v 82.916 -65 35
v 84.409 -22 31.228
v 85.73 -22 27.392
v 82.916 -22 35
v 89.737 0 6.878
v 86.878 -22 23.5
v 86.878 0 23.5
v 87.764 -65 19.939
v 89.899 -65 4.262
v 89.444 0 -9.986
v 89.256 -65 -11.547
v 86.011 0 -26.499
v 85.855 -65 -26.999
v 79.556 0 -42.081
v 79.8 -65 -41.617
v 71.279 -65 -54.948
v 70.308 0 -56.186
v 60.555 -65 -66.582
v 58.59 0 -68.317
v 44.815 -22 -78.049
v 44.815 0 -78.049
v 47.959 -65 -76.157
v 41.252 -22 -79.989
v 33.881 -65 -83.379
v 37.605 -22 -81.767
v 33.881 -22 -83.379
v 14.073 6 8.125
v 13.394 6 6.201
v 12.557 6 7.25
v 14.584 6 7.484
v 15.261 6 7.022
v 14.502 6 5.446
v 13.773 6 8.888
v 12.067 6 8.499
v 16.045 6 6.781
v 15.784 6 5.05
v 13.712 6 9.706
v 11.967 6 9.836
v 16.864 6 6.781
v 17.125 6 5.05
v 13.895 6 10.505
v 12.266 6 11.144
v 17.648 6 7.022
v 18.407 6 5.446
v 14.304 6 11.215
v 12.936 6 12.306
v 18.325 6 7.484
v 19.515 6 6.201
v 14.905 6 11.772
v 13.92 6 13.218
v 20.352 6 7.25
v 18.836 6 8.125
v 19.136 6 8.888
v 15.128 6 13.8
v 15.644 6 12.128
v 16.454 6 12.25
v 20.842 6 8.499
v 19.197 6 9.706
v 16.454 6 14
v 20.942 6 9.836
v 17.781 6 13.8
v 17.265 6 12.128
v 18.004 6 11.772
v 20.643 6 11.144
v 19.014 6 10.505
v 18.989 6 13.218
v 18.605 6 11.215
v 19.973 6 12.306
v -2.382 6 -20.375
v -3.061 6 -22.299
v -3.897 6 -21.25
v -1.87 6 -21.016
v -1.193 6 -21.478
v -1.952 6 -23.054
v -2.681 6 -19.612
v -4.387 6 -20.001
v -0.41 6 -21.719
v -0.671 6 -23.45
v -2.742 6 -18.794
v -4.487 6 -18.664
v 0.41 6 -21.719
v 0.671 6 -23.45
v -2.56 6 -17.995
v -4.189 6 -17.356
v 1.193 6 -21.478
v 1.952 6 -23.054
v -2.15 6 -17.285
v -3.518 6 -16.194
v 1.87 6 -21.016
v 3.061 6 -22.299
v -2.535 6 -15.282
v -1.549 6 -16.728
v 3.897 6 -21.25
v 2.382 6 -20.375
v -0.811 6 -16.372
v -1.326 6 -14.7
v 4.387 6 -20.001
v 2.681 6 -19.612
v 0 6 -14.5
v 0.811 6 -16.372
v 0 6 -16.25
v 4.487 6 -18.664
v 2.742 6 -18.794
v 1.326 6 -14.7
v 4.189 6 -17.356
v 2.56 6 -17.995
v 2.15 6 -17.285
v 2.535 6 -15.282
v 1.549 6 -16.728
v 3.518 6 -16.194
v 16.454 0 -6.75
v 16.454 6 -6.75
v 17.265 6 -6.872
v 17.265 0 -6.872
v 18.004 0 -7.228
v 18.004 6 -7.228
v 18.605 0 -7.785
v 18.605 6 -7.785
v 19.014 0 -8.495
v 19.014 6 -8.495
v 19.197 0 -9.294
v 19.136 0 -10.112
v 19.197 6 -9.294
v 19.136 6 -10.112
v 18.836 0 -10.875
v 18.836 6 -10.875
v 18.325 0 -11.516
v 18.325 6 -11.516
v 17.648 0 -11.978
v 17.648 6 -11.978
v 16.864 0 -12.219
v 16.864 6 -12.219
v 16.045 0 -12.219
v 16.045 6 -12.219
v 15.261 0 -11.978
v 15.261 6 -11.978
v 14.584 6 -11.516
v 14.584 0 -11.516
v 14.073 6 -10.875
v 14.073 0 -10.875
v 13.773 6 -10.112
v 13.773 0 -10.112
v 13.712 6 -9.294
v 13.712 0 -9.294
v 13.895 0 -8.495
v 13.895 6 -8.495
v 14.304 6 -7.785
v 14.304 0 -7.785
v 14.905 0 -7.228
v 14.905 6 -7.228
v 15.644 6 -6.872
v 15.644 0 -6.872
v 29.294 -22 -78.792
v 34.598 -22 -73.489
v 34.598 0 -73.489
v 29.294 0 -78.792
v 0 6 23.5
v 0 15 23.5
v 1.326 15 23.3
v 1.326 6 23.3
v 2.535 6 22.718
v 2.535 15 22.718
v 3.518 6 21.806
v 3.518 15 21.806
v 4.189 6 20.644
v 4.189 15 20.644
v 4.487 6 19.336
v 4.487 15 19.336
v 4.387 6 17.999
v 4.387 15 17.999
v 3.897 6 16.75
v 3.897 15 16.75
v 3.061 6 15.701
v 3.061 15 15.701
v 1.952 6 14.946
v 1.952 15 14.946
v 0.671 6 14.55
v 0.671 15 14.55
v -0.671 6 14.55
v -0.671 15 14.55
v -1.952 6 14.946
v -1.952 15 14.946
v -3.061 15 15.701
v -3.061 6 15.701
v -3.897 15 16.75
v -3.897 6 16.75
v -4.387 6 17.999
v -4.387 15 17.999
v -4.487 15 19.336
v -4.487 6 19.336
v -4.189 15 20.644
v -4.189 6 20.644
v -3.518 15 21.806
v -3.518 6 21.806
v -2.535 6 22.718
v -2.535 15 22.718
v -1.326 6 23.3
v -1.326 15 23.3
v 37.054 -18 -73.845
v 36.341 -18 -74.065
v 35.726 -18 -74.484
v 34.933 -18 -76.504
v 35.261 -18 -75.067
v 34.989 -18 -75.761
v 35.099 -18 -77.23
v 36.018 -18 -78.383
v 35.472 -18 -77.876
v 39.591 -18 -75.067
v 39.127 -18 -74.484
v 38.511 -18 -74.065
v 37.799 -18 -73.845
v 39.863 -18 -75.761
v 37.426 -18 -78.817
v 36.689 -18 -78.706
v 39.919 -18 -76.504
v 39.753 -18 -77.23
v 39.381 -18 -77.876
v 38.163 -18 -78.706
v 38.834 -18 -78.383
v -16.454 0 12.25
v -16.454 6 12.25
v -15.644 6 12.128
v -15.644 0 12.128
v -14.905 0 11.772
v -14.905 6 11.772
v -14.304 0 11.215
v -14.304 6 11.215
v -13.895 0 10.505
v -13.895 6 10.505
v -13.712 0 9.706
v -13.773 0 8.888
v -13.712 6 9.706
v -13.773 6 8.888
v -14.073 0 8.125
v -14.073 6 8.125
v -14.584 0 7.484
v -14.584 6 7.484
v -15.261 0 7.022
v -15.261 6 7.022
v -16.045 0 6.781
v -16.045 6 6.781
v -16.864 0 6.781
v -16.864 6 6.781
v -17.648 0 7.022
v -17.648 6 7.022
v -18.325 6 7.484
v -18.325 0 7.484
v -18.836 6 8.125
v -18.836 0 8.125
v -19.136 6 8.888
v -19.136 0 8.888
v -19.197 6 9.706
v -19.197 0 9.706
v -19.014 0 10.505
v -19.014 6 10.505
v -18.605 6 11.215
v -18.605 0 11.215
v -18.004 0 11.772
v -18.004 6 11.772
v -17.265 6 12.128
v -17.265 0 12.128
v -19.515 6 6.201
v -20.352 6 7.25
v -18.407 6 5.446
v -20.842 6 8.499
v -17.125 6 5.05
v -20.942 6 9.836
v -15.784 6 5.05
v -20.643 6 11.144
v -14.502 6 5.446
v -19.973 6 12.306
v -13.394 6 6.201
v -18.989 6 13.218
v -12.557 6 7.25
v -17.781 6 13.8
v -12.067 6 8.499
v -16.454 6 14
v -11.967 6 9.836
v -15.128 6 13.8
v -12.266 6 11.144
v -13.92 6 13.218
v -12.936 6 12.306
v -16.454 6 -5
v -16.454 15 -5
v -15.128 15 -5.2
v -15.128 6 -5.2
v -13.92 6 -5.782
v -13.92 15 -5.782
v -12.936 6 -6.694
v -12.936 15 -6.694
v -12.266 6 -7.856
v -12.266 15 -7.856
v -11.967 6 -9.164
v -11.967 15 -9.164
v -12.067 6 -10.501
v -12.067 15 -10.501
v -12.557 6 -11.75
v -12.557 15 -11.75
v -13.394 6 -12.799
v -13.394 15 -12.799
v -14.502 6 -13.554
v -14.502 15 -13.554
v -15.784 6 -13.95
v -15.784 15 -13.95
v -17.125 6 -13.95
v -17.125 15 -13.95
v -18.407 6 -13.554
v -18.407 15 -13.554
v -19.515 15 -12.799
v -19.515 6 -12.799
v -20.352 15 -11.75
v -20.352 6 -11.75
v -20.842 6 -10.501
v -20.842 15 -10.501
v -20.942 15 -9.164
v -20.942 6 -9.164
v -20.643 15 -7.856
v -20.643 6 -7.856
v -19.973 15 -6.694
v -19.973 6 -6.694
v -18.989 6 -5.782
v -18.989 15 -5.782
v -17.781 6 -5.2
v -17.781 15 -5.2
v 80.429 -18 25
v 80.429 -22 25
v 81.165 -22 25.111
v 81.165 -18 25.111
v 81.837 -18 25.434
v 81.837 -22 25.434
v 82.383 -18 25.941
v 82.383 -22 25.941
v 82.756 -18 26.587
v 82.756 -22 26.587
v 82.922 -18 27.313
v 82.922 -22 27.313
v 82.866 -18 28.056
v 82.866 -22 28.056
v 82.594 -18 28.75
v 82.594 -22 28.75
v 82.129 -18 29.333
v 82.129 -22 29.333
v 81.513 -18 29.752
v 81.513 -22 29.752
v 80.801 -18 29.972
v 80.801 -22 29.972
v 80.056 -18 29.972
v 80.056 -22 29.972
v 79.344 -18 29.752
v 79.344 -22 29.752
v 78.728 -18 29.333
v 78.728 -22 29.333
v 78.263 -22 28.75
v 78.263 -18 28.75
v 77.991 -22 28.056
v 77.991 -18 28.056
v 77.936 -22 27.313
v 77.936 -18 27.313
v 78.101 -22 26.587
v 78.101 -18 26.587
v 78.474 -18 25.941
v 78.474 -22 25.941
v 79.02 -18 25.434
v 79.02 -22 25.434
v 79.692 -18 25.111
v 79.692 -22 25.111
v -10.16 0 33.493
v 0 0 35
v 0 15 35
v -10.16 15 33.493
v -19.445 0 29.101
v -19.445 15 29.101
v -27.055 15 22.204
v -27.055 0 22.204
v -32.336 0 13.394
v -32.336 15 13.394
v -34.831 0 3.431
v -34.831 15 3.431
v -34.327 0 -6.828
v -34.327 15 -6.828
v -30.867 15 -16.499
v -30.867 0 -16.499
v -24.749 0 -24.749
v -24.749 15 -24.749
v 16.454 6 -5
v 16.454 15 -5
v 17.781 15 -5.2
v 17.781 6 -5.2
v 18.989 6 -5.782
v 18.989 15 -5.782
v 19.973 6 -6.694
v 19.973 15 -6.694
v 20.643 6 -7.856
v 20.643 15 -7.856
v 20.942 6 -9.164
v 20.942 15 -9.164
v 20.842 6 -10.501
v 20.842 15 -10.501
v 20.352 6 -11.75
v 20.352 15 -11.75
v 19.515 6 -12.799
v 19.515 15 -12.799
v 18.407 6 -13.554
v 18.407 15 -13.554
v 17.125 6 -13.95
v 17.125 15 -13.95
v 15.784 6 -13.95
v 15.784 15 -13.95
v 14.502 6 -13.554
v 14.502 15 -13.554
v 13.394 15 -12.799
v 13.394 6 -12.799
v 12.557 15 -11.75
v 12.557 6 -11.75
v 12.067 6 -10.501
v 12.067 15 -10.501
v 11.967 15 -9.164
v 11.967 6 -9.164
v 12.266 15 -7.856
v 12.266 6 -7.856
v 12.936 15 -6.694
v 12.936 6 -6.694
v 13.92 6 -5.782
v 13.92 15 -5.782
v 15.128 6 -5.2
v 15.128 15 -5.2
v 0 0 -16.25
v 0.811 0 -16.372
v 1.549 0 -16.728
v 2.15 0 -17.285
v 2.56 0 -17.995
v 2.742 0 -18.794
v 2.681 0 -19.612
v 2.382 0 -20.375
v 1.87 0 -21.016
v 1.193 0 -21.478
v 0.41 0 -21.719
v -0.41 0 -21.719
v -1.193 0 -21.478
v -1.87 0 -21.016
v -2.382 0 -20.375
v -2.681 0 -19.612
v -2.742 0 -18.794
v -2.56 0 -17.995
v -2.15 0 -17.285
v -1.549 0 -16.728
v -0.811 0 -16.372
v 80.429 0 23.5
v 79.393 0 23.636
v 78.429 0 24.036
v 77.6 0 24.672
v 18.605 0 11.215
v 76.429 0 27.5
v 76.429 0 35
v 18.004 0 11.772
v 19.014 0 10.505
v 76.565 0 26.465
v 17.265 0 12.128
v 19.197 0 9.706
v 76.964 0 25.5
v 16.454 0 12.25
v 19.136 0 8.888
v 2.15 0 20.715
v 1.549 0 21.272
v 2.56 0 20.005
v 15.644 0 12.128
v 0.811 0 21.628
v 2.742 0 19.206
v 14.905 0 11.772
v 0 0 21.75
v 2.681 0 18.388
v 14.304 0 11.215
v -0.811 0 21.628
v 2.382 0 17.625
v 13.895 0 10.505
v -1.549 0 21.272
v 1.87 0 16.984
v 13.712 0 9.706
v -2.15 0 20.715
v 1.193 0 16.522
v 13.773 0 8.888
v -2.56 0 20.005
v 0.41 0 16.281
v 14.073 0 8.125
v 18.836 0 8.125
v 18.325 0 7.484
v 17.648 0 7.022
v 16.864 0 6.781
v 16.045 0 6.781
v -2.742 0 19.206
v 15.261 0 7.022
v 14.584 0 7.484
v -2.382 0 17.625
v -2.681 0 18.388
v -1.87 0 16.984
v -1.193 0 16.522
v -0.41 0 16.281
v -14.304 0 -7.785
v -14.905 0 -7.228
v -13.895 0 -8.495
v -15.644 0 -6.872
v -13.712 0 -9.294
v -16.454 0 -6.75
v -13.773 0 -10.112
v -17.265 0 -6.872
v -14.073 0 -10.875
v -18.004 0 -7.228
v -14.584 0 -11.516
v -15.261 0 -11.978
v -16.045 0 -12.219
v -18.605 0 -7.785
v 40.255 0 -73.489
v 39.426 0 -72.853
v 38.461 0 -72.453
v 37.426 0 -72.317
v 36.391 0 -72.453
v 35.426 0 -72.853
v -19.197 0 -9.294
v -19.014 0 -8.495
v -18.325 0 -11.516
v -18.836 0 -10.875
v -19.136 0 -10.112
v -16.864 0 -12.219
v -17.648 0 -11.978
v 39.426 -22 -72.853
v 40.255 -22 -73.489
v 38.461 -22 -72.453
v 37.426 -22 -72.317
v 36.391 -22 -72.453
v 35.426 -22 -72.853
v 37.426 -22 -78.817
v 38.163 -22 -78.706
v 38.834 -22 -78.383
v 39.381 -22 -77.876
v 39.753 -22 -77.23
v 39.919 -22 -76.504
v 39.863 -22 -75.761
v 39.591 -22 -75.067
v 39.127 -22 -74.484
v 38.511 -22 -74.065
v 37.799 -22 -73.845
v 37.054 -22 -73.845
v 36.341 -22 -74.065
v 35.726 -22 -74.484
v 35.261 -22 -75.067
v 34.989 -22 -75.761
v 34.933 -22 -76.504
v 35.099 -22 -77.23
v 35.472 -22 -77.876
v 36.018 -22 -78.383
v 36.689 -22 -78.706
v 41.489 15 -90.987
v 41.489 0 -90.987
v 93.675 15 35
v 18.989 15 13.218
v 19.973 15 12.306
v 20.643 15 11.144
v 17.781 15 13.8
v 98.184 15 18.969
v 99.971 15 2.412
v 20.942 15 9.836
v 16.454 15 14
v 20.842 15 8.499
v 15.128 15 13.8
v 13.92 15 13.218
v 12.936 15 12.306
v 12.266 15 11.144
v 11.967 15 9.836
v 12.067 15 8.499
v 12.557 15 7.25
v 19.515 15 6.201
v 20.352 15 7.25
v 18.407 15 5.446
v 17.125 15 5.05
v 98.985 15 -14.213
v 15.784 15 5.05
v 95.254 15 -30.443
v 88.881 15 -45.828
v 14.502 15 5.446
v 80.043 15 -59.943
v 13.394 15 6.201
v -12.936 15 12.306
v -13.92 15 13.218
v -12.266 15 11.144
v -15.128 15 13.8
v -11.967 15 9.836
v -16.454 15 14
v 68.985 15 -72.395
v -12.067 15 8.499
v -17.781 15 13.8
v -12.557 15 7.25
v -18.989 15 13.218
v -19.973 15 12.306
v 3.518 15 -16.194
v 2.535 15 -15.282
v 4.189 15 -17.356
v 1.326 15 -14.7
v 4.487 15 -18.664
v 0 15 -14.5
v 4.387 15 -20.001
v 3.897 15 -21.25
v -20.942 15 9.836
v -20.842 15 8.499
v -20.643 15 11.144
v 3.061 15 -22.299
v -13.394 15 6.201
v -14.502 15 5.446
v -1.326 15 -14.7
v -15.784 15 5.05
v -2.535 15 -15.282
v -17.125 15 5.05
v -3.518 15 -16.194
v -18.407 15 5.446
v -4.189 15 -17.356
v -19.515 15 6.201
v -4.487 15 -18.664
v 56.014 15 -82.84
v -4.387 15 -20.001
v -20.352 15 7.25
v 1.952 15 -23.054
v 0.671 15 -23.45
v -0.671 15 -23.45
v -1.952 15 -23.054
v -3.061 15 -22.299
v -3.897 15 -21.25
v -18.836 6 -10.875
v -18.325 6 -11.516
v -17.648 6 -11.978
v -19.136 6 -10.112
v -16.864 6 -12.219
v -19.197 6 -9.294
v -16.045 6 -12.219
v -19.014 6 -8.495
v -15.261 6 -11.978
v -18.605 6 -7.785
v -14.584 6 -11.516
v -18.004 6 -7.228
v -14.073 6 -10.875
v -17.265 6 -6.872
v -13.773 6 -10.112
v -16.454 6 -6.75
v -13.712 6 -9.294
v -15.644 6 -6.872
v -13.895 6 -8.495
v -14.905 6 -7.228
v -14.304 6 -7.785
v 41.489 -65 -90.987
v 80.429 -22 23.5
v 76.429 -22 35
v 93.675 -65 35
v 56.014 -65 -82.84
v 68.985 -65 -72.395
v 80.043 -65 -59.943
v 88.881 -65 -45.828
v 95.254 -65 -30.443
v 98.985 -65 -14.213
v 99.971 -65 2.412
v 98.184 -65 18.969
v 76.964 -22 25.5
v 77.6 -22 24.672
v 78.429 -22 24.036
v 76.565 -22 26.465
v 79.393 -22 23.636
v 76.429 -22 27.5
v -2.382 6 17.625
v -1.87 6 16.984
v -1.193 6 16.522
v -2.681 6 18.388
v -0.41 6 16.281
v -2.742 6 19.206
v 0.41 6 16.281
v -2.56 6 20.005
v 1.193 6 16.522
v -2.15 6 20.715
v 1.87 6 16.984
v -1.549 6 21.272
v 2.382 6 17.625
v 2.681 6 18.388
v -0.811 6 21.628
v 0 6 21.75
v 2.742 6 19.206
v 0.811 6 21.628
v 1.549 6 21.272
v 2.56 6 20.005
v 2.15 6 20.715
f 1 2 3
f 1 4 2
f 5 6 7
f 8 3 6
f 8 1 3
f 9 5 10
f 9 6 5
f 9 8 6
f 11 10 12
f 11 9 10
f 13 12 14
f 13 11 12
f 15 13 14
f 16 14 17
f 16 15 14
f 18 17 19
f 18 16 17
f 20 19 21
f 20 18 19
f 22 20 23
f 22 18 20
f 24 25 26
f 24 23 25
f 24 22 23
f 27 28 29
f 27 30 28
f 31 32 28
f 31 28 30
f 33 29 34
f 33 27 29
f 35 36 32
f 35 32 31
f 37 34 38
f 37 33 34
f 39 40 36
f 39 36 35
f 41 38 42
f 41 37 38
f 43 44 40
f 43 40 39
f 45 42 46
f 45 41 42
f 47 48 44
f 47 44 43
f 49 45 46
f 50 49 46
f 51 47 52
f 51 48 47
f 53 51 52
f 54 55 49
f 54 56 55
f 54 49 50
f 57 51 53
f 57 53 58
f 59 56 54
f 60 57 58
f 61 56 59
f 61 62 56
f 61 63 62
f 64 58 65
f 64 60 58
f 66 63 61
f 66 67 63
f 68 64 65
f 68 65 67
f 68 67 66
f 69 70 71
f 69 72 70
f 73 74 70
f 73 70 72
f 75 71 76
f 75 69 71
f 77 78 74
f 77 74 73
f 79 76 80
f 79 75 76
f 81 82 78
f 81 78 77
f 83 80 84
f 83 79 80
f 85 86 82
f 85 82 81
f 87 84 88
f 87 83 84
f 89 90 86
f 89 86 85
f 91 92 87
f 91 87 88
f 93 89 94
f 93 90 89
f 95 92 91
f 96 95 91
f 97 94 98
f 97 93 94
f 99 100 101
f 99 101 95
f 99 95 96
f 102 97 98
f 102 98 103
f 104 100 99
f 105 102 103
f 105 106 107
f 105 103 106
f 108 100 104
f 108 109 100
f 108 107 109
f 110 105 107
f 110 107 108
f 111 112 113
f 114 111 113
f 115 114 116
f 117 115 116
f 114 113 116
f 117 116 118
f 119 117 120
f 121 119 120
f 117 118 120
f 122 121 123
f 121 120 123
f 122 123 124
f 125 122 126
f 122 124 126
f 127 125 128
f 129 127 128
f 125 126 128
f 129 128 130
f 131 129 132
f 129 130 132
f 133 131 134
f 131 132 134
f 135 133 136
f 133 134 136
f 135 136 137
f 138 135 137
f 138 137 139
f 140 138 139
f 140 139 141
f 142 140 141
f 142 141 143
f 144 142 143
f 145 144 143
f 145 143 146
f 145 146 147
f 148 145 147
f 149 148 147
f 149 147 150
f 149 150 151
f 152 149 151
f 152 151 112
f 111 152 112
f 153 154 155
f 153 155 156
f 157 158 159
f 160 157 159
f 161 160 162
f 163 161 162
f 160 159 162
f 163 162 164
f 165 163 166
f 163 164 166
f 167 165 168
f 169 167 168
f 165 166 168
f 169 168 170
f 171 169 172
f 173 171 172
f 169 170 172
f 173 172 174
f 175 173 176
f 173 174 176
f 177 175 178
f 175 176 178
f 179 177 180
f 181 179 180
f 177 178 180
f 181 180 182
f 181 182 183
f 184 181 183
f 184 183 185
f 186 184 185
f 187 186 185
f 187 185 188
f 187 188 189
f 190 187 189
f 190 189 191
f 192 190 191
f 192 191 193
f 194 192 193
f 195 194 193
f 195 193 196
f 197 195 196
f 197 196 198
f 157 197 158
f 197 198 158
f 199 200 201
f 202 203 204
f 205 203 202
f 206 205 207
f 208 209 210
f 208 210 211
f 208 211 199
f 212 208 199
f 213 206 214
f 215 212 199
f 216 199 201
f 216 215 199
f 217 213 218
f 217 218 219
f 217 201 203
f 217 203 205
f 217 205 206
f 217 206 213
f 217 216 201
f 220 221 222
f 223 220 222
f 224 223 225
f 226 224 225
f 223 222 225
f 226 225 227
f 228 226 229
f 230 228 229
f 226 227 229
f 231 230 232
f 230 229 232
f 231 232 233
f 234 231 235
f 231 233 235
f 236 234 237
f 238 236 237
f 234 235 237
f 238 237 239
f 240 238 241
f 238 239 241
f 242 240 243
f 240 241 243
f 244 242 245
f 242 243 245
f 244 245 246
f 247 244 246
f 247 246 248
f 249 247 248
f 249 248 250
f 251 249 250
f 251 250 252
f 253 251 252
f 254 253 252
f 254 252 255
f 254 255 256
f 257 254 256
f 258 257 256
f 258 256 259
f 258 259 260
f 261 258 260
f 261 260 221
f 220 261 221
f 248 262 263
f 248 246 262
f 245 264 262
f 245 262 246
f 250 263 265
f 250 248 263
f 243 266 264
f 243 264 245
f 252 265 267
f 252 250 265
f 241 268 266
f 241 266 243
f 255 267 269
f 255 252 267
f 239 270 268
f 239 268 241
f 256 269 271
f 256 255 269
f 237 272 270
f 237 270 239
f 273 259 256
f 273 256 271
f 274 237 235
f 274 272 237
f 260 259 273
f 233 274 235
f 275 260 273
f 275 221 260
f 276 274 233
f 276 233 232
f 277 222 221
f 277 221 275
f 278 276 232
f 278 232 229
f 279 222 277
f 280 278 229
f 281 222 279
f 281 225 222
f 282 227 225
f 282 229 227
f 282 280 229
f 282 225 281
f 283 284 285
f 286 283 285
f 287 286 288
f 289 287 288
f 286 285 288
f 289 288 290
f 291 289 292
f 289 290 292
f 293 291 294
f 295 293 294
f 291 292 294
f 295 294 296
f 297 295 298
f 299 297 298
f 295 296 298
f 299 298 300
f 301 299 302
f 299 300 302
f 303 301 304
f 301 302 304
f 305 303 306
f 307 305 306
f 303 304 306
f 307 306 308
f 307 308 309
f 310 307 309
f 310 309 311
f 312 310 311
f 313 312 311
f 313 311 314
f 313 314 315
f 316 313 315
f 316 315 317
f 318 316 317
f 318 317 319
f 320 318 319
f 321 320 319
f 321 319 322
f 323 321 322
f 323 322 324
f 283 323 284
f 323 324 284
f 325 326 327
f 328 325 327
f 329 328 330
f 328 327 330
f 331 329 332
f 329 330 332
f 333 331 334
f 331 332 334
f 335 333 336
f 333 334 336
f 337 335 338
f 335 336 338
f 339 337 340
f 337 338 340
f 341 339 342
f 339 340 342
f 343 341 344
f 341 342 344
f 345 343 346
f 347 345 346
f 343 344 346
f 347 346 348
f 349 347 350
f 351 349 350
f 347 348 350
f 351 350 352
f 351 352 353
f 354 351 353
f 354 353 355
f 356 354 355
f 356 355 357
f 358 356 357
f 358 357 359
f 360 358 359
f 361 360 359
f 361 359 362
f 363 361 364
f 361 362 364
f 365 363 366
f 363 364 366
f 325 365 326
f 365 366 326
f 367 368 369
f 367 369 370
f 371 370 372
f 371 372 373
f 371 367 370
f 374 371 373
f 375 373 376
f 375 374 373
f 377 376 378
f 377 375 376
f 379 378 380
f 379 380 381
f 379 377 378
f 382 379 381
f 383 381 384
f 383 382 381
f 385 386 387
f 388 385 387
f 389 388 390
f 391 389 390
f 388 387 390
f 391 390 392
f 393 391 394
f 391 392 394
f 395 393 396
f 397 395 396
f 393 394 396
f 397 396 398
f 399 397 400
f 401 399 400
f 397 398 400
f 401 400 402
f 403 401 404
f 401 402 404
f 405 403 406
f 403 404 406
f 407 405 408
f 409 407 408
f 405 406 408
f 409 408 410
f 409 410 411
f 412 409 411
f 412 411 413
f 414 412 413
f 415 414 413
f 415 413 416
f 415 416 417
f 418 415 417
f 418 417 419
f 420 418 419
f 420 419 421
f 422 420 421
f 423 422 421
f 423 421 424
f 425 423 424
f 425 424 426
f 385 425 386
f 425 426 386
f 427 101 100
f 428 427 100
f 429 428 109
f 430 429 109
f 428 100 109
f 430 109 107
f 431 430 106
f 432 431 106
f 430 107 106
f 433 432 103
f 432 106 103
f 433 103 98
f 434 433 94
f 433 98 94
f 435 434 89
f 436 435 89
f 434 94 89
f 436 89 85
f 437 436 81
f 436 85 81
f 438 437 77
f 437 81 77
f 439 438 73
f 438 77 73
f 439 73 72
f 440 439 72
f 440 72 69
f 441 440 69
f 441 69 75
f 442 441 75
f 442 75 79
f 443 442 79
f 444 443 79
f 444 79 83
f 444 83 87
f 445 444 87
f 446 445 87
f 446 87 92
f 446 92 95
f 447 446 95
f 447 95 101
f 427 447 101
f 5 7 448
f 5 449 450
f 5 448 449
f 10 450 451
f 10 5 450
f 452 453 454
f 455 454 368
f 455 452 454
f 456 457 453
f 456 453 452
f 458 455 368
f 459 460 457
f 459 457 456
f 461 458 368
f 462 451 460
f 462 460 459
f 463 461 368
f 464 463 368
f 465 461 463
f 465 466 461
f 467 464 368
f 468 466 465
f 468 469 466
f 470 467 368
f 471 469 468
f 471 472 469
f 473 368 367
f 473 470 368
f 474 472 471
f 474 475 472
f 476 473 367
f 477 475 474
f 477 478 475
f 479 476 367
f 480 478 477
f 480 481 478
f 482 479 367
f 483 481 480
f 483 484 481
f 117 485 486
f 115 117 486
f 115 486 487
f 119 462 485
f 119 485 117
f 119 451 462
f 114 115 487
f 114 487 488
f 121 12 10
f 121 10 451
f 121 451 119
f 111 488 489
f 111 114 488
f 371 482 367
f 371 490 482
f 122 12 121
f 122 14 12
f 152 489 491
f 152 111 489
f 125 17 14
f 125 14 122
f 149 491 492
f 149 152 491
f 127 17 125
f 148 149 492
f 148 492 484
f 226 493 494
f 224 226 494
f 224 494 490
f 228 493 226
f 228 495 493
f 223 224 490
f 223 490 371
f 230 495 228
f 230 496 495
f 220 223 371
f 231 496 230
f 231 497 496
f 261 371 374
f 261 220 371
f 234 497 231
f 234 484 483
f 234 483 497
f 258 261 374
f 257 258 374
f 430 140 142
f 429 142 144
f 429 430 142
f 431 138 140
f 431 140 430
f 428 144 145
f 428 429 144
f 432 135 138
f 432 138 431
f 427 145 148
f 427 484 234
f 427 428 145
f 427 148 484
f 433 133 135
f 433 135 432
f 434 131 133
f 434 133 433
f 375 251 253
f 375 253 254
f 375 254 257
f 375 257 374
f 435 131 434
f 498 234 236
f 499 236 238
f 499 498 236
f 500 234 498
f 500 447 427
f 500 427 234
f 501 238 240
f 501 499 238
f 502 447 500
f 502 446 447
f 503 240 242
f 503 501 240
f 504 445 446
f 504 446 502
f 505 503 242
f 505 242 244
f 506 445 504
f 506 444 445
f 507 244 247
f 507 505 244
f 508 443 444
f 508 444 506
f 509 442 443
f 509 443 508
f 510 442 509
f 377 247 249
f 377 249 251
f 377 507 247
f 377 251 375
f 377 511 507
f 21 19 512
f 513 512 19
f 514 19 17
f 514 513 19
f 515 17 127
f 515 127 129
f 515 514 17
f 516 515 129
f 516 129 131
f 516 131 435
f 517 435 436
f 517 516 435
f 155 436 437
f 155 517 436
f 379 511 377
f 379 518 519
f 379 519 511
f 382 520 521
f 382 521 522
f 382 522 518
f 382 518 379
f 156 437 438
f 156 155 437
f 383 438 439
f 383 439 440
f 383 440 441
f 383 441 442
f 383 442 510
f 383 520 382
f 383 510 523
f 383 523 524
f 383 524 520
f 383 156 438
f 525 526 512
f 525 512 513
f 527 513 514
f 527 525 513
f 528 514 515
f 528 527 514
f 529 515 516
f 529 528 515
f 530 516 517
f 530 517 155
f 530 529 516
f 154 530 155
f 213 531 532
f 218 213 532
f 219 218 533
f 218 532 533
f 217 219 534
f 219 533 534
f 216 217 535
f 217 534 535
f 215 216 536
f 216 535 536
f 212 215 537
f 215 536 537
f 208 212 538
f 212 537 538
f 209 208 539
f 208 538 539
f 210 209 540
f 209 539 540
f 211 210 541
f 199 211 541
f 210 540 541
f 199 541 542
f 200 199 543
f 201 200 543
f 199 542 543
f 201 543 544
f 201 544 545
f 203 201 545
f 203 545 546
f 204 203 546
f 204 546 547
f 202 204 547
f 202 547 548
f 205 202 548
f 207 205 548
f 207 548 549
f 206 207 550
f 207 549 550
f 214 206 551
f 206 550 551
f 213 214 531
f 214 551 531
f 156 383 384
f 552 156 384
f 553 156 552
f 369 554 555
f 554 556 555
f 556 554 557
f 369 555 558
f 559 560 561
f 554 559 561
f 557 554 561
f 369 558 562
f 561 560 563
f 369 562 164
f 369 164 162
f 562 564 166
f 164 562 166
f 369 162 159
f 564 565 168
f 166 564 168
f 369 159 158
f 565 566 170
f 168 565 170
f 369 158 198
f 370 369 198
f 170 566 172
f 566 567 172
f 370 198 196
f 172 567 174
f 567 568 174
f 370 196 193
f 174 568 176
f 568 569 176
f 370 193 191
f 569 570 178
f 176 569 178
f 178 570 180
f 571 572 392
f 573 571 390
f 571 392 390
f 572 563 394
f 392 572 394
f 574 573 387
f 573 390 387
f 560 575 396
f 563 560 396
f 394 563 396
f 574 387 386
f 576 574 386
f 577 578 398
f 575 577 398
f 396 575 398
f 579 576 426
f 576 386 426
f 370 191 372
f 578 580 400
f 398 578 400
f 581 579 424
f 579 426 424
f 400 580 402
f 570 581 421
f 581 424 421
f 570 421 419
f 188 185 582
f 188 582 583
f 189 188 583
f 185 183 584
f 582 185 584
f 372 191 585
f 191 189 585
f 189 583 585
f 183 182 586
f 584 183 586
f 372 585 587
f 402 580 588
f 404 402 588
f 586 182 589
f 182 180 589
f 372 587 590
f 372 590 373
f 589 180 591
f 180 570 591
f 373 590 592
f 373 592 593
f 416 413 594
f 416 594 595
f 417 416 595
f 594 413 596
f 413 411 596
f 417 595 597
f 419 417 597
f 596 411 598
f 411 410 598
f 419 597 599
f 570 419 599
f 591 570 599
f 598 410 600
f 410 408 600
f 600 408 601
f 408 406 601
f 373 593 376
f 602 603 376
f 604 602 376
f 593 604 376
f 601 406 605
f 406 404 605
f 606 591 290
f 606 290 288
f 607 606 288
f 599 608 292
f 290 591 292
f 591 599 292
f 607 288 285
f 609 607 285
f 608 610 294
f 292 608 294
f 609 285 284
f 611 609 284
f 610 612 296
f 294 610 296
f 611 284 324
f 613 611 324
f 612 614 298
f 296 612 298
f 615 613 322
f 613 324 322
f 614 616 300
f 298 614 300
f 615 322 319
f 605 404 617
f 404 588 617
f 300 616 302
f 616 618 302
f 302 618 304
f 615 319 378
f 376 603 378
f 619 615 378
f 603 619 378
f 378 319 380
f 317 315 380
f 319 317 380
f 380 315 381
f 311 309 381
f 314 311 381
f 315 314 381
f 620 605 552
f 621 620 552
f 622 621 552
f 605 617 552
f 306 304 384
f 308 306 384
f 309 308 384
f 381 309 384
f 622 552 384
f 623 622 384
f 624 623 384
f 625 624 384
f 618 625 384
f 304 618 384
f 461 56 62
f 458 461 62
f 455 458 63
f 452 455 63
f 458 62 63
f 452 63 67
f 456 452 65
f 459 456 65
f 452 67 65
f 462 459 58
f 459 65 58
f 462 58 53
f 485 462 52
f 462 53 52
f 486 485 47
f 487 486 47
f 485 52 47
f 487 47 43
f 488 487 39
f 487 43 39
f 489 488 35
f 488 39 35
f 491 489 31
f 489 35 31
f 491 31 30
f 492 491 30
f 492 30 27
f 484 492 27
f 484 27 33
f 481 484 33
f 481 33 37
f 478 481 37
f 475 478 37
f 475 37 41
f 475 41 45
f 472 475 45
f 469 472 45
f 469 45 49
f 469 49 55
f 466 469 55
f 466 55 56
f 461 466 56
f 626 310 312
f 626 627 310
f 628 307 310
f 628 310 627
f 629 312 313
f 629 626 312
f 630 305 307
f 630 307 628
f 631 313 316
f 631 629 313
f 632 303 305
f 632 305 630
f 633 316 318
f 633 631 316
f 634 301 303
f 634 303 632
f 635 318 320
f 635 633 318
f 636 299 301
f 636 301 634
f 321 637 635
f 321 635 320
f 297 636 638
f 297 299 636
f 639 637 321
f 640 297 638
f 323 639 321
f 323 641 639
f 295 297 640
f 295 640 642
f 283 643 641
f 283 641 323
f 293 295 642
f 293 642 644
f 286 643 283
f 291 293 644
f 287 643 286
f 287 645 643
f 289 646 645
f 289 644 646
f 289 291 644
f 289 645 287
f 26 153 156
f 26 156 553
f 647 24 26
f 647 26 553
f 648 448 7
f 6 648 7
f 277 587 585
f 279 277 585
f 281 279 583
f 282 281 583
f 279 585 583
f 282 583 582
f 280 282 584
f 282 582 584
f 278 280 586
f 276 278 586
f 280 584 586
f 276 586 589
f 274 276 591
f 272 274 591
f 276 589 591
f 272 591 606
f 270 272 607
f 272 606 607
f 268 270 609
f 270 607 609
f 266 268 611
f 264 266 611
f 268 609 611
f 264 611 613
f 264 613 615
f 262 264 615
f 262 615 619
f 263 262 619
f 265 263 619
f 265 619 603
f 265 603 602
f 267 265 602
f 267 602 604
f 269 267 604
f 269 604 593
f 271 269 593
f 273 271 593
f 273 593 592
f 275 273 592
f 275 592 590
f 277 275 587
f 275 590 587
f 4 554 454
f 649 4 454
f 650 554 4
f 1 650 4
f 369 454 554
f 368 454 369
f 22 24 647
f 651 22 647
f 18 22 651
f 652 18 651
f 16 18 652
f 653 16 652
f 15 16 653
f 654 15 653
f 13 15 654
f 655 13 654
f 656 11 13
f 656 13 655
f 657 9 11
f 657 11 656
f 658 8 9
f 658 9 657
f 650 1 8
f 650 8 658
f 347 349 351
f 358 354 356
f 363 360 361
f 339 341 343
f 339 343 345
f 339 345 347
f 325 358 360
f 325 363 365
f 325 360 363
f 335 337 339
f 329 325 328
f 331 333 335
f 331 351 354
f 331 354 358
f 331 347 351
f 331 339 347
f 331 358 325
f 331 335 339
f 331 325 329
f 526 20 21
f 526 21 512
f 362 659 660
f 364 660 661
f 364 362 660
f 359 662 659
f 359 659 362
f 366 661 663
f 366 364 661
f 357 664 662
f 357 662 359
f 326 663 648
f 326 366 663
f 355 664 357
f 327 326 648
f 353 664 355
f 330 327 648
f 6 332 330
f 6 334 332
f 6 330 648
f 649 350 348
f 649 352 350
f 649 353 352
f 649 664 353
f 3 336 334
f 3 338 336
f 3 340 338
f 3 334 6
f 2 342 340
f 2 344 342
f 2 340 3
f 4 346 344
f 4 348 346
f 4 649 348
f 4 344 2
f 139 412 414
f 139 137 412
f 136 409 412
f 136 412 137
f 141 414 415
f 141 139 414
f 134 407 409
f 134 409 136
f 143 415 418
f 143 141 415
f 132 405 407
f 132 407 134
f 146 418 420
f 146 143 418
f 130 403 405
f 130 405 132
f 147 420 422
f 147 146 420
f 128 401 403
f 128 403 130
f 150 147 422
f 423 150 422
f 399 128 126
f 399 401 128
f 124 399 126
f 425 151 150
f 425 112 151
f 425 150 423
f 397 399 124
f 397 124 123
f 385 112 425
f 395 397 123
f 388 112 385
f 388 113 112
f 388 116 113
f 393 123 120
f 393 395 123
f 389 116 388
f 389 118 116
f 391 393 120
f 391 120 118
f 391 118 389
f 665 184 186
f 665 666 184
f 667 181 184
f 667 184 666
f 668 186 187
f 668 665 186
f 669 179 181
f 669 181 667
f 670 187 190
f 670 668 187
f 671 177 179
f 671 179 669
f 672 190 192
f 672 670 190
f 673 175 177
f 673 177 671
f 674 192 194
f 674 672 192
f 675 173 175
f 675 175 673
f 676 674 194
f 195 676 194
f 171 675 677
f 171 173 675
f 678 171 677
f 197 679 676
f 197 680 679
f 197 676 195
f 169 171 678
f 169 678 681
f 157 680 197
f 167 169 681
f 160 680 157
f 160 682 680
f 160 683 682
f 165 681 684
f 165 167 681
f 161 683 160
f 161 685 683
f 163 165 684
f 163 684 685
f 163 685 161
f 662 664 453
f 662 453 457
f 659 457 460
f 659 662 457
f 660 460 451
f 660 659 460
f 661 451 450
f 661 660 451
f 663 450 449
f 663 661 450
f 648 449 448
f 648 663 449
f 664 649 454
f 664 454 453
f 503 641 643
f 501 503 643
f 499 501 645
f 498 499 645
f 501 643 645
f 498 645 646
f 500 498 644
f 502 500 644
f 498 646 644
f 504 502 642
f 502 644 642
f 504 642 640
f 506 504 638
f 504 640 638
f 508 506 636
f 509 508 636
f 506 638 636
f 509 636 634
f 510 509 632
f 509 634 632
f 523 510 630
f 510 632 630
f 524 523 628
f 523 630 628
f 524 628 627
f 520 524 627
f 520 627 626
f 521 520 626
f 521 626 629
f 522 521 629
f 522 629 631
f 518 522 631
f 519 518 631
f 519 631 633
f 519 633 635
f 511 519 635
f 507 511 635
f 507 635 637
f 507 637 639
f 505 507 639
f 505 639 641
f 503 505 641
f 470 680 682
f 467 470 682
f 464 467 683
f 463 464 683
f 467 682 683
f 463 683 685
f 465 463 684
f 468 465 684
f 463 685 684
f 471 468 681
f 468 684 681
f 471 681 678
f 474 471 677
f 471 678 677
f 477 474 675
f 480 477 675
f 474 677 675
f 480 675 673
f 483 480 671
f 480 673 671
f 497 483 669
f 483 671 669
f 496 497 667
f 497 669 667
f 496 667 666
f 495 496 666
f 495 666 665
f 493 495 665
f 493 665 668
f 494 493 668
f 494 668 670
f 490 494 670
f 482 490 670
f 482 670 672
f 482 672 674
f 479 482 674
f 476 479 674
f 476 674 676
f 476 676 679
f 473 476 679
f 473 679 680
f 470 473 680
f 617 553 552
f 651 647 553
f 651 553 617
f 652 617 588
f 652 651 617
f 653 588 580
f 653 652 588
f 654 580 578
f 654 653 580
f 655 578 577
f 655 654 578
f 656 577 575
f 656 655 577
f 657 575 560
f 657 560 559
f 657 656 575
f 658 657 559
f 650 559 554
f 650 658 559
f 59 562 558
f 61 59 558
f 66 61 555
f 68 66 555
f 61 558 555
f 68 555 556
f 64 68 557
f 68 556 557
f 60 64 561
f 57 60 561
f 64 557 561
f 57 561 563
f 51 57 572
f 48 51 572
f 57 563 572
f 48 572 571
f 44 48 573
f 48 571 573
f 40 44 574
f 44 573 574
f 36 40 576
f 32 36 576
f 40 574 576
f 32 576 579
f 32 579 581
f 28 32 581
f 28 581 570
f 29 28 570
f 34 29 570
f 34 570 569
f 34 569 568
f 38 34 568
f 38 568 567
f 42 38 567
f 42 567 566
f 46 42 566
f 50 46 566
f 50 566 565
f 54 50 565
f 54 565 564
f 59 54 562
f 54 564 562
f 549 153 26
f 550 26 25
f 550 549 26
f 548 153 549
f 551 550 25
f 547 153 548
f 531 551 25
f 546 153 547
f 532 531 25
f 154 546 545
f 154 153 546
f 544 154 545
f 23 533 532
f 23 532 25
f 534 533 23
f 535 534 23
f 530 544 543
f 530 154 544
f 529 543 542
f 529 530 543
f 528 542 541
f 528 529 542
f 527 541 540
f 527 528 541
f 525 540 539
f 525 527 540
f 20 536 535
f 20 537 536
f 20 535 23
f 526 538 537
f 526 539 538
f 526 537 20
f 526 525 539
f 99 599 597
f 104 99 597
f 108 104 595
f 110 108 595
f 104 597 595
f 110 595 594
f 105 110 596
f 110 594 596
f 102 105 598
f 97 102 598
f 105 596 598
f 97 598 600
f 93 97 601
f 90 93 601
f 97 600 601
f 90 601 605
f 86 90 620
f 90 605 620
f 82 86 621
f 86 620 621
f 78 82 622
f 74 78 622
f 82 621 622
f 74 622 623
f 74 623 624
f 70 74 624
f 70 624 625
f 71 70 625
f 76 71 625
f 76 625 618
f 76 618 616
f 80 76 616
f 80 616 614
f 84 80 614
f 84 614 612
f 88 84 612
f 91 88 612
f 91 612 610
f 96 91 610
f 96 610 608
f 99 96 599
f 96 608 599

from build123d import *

# Parameters (mm, degrees)
BOSS_EXTRUDE1_DEPTH = 15
SKETCH2_R           = 4.5
CUT_EXTRUDE1_DEPTH  = 9
SKETCH3_R           = 2.75
CUT_EXTRUDE2_DEPTH  = 136.49768983
BOSS_EXTRUDE2_START = 65
BOSS_EXTRUDE2_DEPTH = 65
BOSS_EXTRUDE3_START = 22
BOSS_EXTRUDE3_DEPTH = 22
SKETCH6_R           = 2.5
CUT_EXTRUDE3_DEPTH  = 4


with BuildPart() as part:
    # Sketch1 → Boss-Extrude1 (new body)
    with BuildSketch(Plane(origin=(0, 0, 0), x_dir=(1, 0, 0), z_dir=(0, 1, 0))):
        with BuildLine():
            Line((-24.748737342, 24.748737342), (41.489469156, 90.986943839))
            ThreePointArc((41.489469156, 90.986943839), (92.387953251, 38.268343237), (93.674969976, -35))
            Line((93.674969976, -35), (0, -35))
            ThreePointArc((0, -35), (-32.335783638, -13.393920133), (-24.748737342, 24.748737342))
        make_face()
    extrude(amount=BOSS_EXTRUDE1_DEPTH)

    # Sketch2 → Cut-Extrude1 (cut)
    with BuildSketch(Plane(origin=(0, 15, 0), x_dir=(1, 0, 0), z_dir=(0, 1, 0))):
        with Locations(Location((0, 19, 0), (0, 0, 270))):
            Circle(SKETCH2_R)
        with Locations(Location((16.454482672, 9.5, 0), (0, 0, 270))):
            Circle(SKETCH2_R)
        with Locations(Location((16.454482672, -9.5, 0), (0, 0, 270))):
            Circle(SKETCH2_R)
        with Locations(Location((0, -19, 0), (0, 0, 270))):
            Circle(SKETCH2_R)
        with Locations(Location((-16.454482672, -9.5, 0), (0, 0, 270))):
            Circle(SKETCH2_R)
        with Locations(Location((-16.454482672, 9.5, 0), (0, 0, 270))):
            Circle(SKETCH2_R)
    extrude(amount=-CUT_EXTRUDE1_DEPTH, mode=Mode.SUBTRACT)

    # Sketch3 → Cut-Extrude2 (cut, through all)
    with BuildSketch(Plane(origin=(0, 6, 0), x_dir=(1, 0, 0), z_dir=(0, 1, 0))):
        with Locations(Location((0, 19, 0), (0, 0, 270))):
            Circle(SKETCH3_R)
        with Locations(Location((16.454482672, 9.5, 0), (0, 0, 270))):
            Circle(SKETCH3_R)
        with Locations(Location((16.454482672, -9.5, 0), (0, 0, 270))):
            Circle(SKETCH3_R)
        with Locations(Location((0, -19, 0), (0, 0, 270))):
            Circle(SKETCH3_R)
        with Locations(Location((-16.454482672, -9.5, 0), (0, 0, 270))):
            Circle(SKETCH3_R)
        with Locations(Location((-16.454482672, 9.5, 0), (0, 0, 270))):
            Circle(SKETCH3_R)
    extrude(amount=-CUT_EXTRUDE2_DEPTH, mode=Mode.SUBTRACT)

    # Sketch4 → Boss-Extrude2 (add)
    with BuildSketch(Plane.XZ.offset(BOSS_EXTRUDE2_START)):
        with BuildLine():
            Line((93.674969976, 35), (82.915619759, 35))
            ThreePointArc((82.915619759, 35), (83.149157926, -34.441508913), (33.881459656, -83.378934339))
            Line((33.881459656, -83.378934339), (41.489469156, -90.986943839))
            ThreePointArc((41.489469156, -90.986943839), (92.387953251, -38.268343237), (93.674969976, 35))
        make_face()
    extrude(amount=-BOSS_EXTRUDE2_DEPTH)

    # Sketch5 → Boss-Extrude3 (add)
    with BuildSketch(Plane.XZ.offset(BOSS_EXTRUDE3_START)):
        with BuildLine():
            Line((80.428539711, 23.5), (86.877787725, 23.5))
            ThreePointArc((86.877787725, 23.5), (85.091202872, 29.317012019), (82.915619759, 35))
            Line((82.915619759, 35), (76.428539711, 35))
            Line((76.428539711, 35), (76.428539711, 27.5))
            ThreePointArc((76.428539711, 27.5), (77.600112586, 24.671572875), (80.428539711, 23.5))
        make_face()
        with BuildLine():
            Line((34.597702223, -73.488575188), (29.294401364, -78.791876047))
            Line((29.294401364, -78.791876047), (33.881459656, -83.378934339))
            ThreePointArc((33.881459656, -83.378934339), (39.438308567, -80.898824573), (44.814863477, -78.048882193))
            Line((44.814863477, -78.048882193), (40.254556473, -73.488575188))
            ThreePointArc((40.254556473, -73.488575188), (37.426129348, -72.317002313), (34.597702223, -73.488575188))
        make_face()
    extrude(amount=-BOSS_EXTRUDE3_DEPTH)

    # Sketch6 → Cut-Extrude3 (cut)
    with BuildSketch(Plane.XZ.offset(22)):
        with Locations(Location((80.428539711, 27.5, 0), (0, 0, 270))):
            Circle(SKETCH6_R)
        with Locations(Location((37.426129348, -76.317002313, 0), (0, 0, 270))):
            Circle(SKETCH6_R)
    extrude(amount=-CUT_EXTRUDE3_DEPTH, mode=Mode.SUBTRACT)


solid = part.part
